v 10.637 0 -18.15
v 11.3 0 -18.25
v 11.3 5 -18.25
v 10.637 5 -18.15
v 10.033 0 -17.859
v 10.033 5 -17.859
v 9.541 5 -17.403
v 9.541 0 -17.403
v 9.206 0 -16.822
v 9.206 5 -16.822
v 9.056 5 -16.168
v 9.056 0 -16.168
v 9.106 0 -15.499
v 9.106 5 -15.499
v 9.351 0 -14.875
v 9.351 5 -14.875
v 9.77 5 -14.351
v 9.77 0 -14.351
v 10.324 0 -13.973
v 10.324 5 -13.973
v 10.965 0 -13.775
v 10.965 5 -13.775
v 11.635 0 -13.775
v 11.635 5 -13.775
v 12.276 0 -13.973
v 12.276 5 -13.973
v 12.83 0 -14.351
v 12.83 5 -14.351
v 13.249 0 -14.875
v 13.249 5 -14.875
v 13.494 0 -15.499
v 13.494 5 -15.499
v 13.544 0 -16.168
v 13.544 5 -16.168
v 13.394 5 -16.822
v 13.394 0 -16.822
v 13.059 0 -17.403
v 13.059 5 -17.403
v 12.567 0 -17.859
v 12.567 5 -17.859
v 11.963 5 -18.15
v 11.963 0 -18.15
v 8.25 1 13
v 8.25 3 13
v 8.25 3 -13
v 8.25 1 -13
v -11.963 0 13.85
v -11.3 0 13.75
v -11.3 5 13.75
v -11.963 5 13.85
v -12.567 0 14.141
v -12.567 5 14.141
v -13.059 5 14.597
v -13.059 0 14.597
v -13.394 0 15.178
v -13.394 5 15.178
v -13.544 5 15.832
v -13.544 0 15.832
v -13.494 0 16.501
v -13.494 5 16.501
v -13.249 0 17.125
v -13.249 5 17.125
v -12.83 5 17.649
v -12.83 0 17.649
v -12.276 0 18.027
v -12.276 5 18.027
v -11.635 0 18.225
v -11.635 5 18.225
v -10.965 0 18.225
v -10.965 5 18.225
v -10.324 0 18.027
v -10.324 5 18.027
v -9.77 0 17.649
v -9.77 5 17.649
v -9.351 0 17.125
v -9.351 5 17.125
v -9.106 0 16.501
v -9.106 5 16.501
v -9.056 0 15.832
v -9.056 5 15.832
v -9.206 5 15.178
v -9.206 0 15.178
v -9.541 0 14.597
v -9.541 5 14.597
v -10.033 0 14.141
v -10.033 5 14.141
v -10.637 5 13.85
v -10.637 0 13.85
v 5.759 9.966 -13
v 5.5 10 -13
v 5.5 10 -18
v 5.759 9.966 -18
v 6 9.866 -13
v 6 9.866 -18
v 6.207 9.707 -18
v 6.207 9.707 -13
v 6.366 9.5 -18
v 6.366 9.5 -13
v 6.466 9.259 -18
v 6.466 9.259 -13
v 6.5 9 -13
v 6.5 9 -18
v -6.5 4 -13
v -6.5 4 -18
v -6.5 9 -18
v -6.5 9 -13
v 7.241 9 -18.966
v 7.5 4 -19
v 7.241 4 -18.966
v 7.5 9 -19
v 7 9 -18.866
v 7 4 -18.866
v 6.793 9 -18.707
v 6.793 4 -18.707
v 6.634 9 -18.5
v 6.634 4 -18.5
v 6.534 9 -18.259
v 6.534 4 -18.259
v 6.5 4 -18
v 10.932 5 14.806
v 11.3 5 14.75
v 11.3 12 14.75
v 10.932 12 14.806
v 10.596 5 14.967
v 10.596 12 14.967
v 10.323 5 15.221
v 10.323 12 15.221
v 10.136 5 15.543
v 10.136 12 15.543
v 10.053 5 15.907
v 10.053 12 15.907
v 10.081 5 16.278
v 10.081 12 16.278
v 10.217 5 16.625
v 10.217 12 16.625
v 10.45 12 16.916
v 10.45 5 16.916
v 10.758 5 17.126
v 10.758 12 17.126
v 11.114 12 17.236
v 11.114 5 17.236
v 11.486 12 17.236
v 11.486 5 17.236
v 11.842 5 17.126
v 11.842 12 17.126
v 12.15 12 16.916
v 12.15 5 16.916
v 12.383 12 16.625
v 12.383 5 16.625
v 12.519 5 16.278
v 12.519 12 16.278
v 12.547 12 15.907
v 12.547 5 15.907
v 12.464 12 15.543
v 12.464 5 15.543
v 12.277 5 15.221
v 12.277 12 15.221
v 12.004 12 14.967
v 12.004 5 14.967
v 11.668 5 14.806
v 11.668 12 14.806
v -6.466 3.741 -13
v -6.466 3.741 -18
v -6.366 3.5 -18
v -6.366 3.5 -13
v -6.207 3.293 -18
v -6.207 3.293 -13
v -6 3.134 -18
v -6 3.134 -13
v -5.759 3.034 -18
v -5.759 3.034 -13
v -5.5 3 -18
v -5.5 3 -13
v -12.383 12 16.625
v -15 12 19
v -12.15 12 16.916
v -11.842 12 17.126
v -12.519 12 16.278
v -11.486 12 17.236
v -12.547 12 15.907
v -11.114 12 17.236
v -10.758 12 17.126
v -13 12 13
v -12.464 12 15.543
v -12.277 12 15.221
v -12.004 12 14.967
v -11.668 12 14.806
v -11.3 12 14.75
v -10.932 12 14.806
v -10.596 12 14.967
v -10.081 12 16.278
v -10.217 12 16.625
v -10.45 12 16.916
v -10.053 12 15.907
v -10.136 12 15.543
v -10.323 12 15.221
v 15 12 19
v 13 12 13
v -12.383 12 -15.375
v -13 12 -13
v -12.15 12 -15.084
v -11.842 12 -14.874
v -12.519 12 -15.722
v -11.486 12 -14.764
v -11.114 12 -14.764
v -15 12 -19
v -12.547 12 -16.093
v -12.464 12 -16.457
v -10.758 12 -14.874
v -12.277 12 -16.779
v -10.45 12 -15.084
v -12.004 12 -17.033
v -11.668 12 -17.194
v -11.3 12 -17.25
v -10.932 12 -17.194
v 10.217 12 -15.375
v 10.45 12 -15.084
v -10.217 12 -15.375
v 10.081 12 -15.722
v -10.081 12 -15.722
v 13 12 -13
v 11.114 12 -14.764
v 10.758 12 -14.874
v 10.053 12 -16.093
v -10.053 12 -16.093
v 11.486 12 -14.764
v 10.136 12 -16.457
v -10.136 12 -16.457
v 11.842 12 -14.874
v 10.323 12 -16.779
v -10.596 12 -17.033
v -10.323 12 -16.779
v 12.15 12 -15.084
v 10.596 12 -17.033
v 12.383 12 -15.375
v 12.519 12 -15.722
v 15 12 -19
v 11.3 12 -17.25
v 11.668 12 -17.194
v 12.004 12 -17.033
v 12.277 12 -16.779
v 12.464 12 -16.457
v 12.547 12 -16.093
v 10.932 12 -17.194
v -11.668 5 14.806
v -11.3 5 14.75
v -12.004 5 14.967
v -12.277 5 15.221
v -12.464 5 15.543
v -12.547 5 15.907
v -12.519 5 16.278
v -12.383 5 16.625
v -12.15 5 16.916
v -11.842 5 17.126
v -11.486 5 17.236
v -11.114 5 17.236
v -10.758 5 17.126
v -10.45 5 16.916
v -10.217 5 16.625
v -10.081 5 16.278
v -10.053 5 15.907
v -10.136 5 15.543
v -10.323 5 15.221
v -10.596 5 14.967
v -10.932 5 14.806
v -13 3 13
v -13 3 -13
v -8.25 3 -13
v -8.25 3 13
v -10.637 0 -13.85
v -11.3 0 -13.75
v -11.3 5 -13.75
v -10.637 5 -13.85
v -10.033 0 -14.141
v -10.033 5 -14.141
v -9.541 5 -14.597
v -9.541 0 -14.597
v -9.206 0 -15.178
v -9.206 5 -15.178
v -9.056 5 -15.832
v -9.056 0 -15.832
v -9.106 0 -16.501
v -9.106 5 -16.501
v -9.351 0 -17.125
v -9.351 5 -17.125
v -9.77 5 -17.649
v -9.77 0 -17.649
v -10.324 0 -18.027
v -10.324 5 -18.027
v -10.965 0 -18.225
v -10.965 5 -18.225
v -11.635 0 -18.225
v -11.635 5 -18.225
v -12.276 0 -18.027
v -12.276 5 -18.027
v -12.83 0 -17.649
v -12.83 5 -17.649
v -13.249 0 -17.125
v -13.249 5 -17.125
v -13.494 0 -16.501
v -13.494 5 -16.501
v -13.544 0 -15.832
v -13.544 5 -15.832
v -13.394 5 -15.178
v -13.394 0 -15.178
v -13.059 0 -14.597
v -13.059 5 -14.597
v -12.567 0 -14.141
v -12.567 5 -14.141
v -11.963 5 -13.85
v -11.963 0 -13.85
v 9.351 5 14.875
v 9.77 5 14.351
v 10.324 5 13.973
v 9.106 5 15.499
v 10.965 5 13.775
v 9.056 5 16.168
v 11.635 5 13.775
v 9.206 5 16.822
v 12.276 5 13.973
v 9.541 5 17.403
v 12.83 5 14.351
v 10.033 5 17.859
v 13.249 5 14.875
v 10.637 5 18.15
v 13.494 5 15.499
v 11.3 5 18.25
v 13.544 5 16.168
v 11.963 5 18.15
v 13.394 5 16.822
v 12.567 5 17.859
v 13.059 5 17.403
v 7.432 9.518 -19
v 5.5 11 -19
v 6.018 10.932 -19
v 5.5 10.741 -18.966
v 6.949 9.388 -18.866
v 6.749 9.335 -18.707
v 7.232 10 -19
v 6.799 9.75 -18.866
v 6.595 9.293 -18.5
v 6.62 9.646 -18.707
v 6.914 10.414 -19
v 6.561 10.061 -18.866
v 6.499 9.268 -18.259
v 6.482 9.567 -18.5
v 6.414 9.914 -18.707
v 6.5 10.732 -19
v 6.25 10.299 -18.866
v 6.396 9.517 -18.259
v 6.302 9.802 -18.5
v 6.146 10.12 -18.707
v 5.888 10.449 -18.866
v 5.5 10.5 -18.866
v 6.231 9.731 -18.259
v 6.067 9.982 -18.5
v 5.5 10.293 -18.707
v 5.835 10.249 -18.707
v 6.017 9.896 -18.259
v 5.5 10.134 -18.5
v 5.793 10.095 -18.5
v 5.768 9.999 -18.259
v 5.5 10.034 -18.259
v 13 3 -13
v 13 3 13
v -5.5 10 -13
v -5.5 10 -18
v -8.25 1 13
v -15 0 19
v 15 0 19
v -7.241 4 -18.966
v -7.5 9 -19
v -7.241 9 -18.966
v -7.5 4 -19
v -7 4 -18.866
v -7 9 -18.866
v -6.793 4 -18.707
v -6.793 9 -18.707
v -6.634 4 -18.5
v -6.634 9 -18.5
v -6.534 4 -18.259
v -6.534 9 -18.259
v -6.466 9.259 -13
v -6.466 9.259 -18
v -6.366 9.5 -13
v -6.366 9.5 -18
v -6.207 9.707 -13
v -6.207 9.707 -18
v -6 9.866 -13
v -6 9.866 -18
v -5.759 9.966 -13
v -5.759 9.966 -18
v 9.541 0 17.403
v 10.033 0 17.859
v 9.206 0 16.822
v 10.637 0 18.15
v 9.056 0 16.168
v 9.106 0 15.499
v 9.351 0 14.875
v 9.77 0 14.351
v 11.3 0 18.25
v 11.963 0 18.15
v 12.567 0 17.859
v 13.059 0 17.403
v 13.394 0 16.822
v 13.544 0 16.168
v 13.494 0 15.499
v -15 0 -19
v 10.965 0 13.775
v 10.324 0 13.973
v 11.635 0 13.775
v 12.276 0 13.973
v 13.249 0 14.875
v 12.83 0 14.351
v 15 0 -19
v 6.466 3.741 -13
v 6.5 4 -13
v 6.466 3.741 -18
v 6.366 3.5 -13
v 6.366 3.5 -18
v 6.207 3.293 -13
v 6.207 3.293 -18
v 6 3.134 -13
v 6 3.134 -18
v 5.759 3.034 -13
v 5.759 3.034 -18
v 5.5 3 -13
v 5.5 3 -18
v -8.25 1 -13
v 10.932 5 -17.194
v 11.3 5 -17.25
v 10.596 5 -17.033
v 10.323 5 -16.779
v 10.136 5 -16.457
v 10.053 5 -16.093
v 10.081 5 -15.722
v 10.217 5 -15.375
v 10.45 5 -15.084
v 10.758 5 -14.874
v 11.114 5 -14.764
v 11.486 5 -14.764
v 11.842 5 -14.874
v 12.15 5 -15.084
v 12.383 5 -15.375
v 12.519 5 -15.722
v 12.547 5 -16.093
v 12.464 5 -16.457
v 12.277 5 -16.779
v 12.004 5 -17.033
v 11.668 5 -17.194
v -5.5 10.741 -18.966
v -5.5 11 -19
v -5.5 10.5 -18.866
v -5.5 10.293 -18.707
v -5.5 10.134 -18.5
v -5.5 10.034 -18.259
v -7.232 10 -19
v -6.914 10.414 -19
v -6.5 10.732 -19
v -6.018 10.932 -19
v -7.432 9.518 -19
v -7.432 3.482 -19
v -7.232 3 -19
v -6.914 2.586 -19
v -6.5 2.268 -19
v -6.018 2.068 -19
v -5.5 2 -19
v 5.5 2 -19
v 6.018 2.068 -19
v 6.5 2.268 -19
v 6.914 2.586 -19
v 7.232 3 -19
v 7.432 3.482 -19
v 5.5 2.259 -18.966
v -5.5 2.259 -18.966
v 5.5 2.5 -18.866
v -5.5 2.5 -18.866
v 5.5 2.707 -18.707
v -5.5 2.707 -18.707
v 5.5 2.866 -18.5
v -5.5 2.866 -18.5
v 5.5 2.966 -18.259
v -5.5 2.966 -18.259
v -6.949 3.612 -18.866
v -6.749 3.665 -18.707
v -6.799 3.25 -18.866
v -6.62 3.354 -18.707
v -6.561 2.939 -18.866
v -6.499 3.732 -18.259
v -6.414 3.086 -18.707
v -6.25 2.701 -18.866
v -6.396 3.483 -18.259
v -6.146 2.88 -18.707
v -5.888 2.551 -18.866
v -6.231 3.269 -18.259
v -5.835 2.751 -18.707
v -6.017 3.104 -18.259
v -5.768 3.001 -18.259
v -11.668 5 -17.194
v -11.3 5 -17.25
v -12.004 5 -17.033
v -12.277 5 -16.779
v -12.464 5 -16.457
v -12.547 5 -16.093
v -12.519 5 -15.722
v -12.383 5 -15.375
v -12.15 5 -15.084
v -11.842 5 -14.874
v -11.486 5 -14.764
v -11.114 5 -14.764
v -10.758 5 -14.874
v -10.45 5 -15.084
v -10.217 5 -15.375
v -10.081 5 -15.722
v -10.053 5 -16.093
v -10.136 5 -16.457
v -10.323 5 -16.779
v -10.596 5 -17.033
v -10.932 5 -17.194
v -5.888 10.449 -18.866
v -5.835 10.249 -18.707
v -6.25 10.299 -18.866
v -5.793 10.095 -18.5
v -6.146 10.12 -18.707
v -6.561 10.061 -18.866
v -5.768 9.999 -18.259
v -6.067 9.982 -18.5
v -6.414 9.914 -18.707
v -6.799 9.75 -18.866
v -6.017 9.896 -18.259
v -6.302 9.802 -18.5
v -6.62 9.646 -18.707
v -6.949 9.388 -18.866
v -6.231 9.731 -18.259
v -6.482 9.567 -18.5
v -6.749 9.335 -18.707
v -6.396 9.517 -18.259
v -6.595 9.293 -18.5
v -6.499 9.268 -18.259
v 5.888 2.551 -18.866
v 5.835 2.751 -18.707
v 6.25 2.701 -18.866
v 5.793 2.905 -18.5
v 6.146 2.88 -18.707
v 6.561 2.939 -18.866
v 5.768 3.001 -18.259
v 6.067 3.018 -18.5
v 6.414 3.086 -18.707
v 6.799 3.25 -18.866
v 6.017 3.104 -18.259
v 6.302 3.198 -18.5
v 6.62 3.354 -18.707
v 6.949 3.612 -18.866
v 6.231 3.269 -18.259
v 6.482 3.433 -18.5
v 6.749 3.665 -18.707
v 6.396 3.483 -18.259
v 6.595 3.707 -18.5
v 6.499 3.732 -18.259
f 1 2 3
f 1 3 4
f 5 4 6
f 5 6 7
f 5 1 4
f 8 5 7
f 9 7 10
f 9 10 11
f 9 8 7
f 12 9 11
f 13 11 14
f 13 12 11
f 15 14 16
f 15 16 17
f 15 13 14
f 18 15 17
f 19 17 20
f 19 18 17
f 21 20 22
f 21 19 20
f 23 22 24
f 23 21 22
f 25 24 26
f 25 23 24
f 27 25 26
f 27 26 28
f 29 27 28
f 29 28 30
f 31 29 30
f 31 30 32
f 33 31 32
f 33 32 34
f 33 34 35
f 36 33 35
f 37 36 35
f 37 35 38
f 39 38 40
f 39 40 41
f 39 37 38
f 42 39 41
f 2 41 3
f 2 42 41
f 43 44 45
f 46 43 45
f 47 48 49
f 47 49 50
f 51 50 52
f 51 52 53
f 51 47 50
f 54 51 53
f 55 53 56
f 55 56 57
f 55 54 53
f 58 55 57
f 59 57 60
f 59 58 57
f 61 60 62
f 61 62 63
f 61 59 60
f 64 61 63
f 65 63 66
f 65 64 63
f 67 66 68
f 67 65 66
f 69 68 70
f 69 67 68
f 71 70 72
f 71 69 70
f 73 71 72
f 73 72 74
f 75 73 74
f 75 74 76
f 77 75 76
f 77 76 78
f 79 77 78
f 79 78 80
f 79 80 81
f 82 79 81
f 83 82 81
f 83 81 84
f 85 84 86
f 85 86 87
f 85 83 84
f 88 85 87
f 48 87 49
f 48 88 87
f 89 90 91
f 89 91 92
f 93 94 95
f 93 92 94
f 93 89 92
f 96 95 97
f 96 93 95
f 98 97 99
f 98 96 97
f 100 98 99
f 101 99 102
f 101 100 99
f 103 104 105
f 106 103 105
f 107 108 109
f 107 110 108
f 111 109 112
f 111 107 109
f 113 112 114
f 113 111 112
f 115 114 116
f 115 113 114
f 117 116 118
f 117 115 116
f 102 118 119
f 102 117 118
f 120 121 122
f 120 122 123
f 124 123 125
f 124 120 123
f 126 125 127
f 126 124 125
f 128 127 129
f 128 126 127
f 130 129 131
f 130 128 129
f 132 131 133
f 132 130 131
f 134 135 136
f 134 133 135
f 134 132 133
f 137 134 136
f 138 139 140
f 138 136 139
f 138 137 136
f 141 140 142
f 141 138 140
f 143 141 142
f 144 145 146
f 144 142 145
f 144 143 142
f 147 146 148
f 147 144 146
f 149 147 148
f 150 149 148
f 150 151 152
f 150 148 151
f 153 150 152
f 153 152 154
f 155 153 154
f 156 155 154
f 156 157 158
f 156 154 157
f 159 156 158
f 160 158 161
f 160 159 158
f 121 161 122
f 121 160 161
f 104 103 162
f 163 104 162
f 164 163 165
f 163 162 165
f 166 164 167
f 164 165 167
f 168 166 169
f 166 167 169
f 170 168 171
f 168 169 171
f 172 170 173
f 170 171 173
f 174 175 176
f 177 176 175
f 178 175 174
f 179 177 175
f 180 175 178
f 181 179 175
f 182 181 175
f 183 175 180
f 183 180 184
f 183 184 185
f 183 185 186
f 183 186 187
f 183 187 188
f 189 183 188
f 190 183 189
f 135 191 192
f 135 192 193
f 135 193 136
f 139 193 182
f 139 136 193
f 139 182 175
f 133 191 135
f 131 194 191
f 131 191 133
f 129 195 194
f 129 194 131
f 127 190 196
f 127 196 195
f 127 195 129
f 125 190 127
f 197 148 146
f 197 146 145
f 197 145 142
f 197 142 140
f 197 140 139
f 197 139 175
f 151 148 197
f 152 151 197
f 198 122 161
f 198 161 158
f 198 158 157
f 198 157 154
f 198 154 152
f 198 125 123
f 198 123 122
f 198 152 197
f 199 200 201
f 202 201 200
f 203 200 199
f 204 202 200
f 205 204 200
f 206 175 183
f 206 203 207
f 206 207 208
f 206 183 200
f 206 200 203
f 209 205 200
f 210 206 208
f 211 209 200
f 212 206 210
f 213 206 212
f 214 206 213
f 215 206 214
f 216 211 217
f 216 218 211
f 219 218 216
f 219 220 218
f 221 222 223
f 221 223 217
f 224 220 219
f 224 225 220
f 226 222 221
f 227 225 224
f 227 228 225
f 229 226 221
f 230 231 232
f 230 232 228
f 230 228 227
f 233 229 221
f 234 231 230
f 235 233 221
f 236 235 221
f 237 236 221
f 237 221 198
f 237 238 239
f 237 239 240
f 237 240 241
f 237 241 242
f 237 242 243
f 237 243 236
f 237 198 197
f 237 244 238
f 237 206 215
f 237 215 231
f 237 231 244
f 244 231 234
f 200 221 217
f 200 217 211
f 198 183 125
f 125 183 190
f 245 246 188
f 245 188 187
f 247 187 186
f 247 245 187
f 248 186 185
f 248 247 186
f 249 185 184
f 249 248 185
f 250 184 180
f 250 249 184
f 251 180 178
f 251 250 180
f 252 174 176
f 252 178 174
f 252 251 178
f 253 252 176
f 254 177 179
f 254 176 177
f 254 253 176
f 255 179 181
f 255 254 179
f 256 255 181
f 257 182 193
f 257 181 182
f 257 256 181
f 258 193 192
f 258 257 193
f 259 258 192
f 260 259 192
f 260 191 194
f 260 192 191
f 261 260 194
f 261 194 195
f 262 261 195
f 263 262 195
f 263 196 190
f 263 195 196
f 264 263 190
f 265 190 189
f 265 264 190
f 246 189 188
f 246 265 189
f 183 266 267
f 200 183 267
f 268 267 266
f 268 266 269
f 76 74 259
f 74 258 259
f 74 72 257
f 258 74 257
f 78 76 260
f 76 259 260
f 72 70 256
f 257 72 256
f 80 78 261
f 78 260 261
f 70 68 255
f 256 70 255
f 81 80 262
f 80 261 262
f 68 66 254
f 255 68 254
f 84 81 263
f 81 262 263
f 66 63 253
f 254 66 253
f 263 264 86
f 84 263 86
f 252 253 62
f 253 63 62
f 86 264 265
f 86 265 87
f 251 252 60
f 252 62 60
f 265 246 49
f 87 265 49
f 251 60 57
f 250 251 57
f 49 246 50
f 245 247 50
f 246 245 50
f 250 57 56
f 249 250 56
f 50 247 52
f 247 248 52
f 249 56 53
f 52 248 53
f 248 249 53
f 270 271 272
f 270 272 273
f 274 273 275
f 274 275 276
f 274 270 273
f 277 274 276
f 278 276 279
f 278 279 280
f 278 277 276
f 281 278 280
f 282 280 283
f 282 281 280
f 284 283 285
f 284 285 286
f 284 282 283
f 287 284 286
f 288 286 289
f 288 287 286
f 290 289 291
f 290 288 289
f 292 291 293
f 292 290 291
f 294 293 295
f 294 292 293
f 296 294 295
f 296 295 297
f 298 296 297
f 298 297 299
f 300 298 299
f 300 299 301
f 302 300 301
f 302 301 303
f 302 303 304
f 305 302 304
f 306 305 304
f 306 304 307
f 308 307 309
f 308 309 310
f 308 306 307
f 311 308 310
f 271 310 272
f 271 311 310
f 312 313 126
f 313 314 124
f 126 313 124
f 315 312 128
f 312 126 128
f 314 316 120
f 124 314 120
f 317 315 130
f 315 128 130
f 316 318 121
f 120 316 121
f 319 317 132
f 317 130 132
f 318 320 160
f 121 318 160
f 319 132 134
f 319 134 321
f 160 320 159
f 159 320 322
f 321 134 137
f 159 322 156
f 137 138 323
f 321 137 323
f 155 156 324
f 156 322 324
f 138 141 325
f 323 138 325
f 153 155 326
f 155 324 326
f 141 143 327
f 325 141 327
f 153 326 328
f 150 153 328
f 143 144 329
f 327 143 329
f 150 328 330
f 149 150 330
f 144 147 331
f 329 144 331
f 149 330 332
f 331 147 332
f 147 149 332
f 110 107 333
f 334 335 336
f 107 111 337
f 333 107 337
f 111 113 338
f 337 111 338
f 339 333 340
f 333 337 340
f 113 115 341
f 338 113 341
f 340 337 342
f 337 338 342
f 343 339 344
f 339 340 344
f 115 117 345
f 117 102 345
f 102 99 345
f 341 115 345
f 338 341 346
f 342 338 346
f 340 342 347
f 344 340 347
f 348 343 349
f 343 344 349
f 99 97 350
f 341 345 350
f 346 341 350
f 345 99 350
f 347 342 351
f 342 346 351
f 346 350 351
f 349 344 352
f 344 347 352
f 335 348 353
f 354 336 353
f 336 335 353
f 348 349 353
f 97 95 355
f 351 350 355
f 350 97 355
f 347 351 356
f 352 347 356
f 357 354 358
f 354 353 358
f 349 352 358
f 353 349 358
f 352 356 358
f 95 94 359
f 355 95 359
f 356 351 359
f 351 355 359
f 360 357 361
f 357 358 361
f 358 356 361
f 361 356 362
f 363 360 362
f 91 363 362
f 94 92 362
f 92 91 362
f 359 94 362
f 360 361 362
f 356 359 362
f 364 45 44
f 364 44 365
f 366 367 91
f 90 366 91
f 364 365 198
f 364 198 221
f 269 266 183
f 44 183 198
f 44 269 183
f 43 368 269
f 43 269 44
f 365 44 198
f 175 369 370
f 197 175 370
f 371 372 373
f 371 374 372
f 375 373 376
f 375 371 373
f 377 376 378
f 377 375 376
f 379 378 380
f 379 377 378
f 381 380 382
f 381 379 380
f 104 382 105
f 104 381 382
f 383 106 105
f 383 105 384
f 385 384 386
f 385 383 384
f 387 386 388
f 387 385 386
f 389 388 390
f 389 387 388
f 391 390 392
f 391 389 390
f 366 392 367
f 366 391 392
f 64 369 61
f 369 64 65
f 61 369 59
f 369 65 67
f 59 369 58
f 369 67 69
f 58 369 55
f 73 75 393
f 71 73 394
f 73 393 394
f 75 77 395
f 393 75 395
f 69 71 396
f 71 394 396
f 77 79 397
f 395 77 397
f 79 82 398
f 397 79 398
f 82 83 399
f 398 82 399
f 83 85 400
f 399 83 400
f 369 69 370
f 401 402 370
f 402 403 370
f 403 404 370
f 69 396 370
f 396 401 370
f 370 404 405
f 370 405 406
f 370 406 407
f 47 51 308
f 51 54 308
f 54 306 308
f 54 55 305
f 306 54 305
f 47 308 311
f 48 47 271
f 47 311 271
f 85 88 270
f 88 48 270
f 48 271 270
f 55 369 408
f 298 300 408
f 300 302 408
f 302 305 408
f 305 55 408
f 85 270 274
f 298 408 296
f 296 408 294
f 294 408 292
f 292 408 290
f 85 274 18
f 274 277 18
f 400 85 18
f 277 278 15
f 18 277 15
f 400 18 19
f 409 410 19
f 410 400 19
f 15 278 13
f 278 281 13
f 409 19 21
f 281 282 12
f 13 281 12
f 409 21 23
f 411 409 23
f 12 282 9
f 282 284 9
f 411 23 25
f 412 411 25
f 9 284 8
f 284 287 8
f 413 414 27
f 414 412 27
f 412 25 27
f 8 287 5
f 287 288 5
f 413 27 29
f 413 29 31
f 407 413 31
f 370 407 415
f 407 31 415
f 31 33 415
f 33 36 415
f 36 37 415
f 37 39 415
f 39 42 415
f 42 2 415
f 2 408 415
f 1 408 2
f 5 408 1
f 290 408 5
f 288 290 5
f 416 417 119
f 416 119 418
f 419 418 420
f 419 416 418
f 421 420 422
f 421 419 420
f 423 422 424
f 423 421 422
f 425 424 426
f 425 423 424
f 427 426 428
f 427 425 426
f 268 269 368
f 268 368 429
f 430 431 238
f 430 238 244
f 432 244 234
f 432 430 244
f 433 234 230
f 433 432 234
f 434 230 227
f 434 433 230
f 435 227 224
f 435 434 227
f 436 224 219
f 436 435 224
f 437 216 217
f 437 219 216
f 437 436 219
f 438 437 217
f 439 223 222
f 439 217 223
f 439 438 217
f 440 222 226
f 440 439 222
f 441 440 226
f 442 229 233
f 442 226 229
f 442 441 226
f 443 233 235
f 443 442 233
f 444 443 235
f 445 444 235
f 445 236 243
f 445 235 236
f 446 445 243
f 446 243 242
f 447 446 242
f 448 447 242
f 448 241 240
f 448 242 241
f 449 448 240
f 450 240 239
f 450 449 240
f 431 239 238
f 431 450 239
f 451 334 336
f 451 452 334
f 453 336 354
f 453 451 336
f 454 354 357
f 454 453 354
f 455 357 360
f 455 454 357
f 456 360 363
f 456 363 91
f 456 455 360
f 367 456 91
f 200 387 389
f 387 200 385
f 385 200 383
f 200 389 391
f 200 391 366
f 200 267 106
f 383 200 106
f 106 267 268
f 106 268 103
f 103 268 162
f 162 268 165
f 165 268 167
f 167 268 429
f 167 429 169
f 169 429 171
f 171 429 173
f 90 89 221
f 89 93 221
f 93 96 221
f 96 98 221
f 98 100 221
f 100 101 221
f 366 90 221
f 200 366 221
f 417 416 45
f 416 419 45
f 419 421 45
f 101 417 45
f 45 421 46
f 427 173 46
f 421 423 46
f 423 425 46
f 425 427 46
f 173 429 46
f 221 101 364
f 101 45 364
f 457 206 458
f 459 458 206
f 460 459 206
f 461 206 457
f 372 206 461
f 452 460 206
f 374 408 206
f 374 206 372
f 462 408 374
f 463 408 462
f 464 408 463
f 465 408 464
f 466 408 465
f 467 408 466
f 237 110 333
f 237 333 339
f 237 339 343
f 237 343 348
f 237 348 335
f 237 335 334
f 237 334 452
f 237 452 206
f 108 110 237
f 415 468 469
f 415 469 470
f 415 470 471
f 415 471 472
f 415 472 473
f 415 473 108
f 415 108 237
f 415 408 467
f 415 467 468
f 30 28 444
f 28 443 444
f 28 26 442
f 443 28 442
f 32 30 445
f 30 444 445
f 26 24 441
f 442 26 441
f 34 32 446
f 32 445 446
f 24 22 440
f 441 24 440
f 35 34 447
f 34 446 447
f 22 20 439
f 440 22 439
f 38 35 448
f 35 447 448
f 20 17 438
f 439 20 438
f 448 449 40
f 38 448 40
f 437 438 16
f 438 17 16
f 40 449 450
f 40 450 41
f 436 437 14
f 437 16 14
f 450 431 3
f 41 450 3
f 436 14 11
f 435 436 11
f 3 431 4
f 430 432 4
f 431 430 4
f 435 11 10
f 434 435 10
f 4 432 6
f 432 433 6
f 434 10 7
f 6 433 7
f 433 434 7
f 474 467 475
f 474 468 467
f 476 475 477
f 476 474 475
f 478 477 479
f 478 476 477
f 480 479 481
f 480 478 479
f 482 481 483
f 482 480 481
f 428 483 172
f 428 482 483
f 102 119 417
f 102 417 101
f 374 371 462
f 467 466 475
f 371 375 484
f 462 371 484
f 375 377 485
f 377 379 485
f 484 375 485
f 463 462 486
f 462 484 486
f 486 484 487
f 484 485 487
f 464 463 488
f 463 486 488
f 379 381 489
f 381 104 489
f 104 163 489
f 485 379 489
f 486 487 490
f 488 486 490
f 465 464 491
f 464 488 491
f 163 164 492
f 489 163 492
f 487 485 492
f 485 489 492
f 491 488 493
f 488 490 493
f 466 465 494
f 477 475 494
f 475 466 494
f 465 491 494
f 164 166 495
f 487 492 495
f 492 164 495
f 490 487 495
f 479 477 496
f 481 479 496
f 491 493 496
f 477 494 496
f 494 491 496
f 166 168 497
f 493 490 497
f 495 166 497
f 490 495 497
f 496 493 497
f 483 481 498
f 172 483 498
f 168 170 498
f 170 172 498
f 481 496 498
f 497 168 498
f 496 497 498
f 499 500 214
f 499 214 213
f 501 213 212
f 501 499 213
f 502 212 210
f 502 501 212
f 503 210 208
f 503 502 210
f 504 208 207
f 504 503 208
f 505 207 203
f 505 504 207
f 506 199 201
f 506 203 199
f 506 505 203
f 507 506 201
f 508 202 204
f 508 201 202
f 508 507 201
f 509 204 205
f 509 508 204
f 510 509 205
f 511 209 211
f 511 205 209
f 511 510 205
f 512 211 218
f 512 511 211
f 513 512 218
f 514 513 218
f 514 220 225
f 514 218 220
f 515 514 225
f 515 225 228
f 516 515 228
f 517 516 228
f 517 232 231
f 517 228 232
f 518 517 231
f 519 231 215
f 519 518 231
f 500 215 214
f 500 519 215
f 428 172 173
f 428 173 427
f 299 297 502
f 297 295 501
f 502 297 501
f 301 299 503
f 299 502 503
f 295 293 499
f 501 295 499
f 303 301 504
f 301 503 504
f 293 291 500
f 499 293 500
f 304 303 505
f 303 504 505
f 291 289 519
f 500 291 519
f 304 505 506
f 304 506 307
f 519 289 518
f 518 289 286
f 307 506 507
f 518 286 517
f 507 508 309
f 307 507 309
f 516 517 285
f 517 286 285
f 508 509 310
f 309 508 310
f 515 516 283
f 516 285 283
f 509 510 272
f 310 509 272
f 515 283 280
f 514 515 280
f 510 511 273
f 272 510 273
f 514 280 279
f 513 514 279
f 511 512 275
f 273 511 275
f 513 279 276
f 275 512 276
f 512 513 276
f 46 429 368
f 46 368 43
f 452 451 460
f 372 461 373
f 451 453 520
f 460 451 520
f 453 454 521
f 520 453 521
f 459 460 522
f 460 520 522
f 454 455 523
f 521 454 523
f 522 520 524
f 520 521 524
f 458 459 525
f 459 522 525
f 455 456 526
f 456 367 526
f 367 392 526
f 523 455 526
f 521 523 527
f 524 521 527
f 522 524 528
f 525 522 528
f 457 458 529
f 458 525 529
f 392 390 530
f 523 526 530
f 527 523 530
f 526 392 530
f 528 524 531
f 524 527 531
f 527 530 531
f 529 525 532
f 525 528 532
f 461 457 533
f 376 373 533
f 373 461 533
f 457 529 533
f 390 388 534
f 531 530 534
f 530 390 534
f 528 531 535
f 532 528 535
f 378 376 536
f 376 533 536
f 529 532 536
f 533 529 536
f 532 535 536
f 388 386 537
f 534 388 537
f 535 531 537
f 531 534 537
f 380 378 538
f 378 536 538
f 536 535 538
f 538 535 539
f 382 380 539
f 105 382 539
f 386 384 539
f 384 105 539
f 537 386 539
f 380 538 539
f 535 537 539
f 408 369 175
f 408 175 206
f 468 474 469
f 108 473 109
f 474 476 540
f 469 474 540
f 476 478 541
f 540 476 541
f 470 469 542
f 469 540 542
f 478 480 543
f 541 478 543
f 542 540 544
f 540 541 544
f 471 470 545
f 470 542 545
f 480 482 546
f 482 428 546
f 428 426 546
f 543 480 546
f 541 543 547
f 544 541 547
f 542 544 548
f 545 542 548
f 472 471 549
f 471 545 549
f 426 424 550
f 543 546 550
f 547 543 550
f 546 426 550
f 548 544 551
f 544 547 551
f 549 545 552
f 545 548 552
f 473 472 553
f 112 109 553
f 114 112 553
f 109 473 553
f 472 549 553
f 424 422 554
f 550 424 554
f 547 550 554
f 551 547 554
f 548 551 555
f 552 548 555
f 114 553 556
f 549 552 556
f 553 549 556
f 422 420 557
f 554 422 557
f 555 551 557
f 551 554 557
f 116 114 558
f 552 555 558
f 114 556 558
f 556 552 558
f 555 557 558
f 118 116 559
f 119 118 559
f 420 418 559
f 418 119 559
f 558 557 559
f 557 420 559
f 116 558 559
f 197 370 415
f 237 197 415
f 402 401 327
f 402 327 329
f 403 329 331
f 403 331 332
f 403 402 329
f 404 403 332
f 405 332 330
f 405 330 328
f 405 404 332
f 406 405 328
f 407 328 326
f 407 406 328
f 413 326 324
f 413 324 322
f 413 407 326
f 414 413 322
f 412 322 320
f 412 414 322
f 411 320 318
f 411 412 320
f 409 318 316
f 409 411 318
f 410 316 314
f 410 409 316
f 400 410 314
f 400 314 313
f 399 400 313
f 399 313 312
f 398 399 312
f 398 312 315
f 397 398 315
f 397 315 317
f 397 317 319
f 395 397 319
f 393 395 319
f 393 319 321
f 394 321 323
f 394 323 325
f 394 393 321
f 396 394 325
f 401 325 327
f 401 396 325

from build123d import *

# Parameters (mm, degrees)
SKETCH_1_W          = 30
SKETCH_1_H          = 38
EXTRUDE_1_DEPTH     = 12
CUT_EXTRUDE_START   = 3
SKETCH_1_4_W        = 26
SKETCH_1_4_H        = 26
CUT_EXTRUDE_1_DEPTH = 14
SKETCH_1_6_W        = 16.5
SKETCH_1_6_H        = 26
CUT_EXTRUDE_2_DEPTH = 2
SKETCH_1_7_R        = 1.25
CUT_EXTRUDE_5_DEPTH = 21
SKETCH_1_8_R        = 2.25
CUT_EXTRUDE_6_DEPTH = 5
SKETCH_3_W          = 13
SKETCH_3_H          = 7
CUT_EXTRUDE_7_DEPTH = 7
FILLET_1_R          = 1
FILLET_2_R          = 1


with BuildPart() as part:
    # 草图1 → 凸台-拉伸1 (new body)
    with BuildSketch(Plane(origin=(0, 0, 0), x_dir=(1, 0, 0), z_dir=(0, 1, 0))):
        Rectangle(SKETCH_1_W, SKETCH_1_H)
    extrude(amount=EXTRUDE_1_DEPTH)

    # 草图1<4> → 切除-拉伸1 (cut)
    with BuildSketch(Plane(origin=(0, 0, 0), x_dir=(1, 0, 0), z_dir=(0, 1, 0)).offset(CUT_EXTRUDE_START)):
        Rectangle(SKETCH_1_4_W, SKETCH_1_4_H)
    extrude(amount=CUT_EXTRUDE_1_DEPTH, mode=Mode.SUBTRACT)

    # 草图1<6> → 切除-拉伸2 (cut)
    with BuildSketch(Plane(origin=(0, 0, 0), x_dir=(1, 0, 0), z_dir=(0, 1, 0)).offset(CUT_EXTRUDE_START)):
        Rectangle(SKETCH_1_6_W, SKETCH_1_6_H)
    extrude(amount=-CUT_EXTRUDE_2_DEPTH, mode=Mode.SUBTRACT)

    # 草图1<7> → 切除-拉伸5 (cut)
    with BuildSketch(Plane(origin=(0, 0, 0), x_dir=(1, 0, 0), z_dir=(0, 1, 0))):
        with Locations(Location((-11.3, 16, 0), (0, 0, 90))):
            Circle(SKETCH_1_7_R)
        with Locations(Location((11.3, 16, 0), (0, 0, 90))):
            Circle(SKETCH_1_7_R)
        with Locations(Location((11.3, -16, 0), (0, 0, 90))):
            Circle(SKETCH_1_7_R)
        with Locations(Location((-11.3, -16, 0), (0, 0, 90))):
            Circle(SKETCH_1_7_R)
    extrude(amount=CUT_EXTRUDE_5_DEPTH, mode=Mode.SUBTRACT)

    # 草图1<8> → 切除-拉伸6 (cut)
    with BuildSketch(Plane(origin=(0, 0, 0), x_dir=(1, 0, 0), z_dir=(0, 1, 0))):
        with Locations(Location((-11.3, 16, 0), (0, 0, 270))):
            Circle(SKETCH_1_8_R)
        with Locations(Location((11.3, 16, 0), (0, 0, 90))):
            Circle(SKETCH_1_8_R)
        with Locations(Location((11.3, -16, 0), (0, 0, 270))):
            Circle(SKETCH_1_8_R)
        with Locations(Location((-11.3, -16, 0), (0, 0, 90))):
            Circle(SKETCH_1_8_R)
    extrude(amount=CUT_EXTRUDE_6_DEPTH, mode=Mode.SUBTRACT)

    # 草图3 → 切除-拉伸7 (cut)
    with BuildSketch(Plane.XY.offset(-19)):
        with Locations((0, 6.5)):
            Rectangle(SKETCH_3_W, SKETCH_3_H)
    extrude(amount=CUT_EXTRUDE_7_DEPTH, mode=Mode.SUBTRACT)

    # 圆角1
    fillet_1_edges = [part.edges().sort_by_distance(p)[0] for p in [
        (6.5, 3, -16),
        (6.5, 10, -16),
        (-6.5, 10, -16),
        (-6.5, 3, -16),
    ]]
    fillet(fillet_1_edges, radius=FILLET_1_R)

    # 圆角2
    fillet_2_edges = [part.edges().sort_by_distance(p)[0] for p in [
        (0, 3, -19),
        (6.5, 6.5, -19),
        (0, 10, -19),
        (-6.5, 6.5, -19),
        (6.207106781, 3.292893219, -19),
        (6.207106781, 9.707106781, -19),
        (-6.207106781, 9.707106781, -19),
        (-6.207106781, 3.292893219, -19),
    ]]
    fillet(fillet_2_edges, radius=FILLET_2_R)


solid = part.part
